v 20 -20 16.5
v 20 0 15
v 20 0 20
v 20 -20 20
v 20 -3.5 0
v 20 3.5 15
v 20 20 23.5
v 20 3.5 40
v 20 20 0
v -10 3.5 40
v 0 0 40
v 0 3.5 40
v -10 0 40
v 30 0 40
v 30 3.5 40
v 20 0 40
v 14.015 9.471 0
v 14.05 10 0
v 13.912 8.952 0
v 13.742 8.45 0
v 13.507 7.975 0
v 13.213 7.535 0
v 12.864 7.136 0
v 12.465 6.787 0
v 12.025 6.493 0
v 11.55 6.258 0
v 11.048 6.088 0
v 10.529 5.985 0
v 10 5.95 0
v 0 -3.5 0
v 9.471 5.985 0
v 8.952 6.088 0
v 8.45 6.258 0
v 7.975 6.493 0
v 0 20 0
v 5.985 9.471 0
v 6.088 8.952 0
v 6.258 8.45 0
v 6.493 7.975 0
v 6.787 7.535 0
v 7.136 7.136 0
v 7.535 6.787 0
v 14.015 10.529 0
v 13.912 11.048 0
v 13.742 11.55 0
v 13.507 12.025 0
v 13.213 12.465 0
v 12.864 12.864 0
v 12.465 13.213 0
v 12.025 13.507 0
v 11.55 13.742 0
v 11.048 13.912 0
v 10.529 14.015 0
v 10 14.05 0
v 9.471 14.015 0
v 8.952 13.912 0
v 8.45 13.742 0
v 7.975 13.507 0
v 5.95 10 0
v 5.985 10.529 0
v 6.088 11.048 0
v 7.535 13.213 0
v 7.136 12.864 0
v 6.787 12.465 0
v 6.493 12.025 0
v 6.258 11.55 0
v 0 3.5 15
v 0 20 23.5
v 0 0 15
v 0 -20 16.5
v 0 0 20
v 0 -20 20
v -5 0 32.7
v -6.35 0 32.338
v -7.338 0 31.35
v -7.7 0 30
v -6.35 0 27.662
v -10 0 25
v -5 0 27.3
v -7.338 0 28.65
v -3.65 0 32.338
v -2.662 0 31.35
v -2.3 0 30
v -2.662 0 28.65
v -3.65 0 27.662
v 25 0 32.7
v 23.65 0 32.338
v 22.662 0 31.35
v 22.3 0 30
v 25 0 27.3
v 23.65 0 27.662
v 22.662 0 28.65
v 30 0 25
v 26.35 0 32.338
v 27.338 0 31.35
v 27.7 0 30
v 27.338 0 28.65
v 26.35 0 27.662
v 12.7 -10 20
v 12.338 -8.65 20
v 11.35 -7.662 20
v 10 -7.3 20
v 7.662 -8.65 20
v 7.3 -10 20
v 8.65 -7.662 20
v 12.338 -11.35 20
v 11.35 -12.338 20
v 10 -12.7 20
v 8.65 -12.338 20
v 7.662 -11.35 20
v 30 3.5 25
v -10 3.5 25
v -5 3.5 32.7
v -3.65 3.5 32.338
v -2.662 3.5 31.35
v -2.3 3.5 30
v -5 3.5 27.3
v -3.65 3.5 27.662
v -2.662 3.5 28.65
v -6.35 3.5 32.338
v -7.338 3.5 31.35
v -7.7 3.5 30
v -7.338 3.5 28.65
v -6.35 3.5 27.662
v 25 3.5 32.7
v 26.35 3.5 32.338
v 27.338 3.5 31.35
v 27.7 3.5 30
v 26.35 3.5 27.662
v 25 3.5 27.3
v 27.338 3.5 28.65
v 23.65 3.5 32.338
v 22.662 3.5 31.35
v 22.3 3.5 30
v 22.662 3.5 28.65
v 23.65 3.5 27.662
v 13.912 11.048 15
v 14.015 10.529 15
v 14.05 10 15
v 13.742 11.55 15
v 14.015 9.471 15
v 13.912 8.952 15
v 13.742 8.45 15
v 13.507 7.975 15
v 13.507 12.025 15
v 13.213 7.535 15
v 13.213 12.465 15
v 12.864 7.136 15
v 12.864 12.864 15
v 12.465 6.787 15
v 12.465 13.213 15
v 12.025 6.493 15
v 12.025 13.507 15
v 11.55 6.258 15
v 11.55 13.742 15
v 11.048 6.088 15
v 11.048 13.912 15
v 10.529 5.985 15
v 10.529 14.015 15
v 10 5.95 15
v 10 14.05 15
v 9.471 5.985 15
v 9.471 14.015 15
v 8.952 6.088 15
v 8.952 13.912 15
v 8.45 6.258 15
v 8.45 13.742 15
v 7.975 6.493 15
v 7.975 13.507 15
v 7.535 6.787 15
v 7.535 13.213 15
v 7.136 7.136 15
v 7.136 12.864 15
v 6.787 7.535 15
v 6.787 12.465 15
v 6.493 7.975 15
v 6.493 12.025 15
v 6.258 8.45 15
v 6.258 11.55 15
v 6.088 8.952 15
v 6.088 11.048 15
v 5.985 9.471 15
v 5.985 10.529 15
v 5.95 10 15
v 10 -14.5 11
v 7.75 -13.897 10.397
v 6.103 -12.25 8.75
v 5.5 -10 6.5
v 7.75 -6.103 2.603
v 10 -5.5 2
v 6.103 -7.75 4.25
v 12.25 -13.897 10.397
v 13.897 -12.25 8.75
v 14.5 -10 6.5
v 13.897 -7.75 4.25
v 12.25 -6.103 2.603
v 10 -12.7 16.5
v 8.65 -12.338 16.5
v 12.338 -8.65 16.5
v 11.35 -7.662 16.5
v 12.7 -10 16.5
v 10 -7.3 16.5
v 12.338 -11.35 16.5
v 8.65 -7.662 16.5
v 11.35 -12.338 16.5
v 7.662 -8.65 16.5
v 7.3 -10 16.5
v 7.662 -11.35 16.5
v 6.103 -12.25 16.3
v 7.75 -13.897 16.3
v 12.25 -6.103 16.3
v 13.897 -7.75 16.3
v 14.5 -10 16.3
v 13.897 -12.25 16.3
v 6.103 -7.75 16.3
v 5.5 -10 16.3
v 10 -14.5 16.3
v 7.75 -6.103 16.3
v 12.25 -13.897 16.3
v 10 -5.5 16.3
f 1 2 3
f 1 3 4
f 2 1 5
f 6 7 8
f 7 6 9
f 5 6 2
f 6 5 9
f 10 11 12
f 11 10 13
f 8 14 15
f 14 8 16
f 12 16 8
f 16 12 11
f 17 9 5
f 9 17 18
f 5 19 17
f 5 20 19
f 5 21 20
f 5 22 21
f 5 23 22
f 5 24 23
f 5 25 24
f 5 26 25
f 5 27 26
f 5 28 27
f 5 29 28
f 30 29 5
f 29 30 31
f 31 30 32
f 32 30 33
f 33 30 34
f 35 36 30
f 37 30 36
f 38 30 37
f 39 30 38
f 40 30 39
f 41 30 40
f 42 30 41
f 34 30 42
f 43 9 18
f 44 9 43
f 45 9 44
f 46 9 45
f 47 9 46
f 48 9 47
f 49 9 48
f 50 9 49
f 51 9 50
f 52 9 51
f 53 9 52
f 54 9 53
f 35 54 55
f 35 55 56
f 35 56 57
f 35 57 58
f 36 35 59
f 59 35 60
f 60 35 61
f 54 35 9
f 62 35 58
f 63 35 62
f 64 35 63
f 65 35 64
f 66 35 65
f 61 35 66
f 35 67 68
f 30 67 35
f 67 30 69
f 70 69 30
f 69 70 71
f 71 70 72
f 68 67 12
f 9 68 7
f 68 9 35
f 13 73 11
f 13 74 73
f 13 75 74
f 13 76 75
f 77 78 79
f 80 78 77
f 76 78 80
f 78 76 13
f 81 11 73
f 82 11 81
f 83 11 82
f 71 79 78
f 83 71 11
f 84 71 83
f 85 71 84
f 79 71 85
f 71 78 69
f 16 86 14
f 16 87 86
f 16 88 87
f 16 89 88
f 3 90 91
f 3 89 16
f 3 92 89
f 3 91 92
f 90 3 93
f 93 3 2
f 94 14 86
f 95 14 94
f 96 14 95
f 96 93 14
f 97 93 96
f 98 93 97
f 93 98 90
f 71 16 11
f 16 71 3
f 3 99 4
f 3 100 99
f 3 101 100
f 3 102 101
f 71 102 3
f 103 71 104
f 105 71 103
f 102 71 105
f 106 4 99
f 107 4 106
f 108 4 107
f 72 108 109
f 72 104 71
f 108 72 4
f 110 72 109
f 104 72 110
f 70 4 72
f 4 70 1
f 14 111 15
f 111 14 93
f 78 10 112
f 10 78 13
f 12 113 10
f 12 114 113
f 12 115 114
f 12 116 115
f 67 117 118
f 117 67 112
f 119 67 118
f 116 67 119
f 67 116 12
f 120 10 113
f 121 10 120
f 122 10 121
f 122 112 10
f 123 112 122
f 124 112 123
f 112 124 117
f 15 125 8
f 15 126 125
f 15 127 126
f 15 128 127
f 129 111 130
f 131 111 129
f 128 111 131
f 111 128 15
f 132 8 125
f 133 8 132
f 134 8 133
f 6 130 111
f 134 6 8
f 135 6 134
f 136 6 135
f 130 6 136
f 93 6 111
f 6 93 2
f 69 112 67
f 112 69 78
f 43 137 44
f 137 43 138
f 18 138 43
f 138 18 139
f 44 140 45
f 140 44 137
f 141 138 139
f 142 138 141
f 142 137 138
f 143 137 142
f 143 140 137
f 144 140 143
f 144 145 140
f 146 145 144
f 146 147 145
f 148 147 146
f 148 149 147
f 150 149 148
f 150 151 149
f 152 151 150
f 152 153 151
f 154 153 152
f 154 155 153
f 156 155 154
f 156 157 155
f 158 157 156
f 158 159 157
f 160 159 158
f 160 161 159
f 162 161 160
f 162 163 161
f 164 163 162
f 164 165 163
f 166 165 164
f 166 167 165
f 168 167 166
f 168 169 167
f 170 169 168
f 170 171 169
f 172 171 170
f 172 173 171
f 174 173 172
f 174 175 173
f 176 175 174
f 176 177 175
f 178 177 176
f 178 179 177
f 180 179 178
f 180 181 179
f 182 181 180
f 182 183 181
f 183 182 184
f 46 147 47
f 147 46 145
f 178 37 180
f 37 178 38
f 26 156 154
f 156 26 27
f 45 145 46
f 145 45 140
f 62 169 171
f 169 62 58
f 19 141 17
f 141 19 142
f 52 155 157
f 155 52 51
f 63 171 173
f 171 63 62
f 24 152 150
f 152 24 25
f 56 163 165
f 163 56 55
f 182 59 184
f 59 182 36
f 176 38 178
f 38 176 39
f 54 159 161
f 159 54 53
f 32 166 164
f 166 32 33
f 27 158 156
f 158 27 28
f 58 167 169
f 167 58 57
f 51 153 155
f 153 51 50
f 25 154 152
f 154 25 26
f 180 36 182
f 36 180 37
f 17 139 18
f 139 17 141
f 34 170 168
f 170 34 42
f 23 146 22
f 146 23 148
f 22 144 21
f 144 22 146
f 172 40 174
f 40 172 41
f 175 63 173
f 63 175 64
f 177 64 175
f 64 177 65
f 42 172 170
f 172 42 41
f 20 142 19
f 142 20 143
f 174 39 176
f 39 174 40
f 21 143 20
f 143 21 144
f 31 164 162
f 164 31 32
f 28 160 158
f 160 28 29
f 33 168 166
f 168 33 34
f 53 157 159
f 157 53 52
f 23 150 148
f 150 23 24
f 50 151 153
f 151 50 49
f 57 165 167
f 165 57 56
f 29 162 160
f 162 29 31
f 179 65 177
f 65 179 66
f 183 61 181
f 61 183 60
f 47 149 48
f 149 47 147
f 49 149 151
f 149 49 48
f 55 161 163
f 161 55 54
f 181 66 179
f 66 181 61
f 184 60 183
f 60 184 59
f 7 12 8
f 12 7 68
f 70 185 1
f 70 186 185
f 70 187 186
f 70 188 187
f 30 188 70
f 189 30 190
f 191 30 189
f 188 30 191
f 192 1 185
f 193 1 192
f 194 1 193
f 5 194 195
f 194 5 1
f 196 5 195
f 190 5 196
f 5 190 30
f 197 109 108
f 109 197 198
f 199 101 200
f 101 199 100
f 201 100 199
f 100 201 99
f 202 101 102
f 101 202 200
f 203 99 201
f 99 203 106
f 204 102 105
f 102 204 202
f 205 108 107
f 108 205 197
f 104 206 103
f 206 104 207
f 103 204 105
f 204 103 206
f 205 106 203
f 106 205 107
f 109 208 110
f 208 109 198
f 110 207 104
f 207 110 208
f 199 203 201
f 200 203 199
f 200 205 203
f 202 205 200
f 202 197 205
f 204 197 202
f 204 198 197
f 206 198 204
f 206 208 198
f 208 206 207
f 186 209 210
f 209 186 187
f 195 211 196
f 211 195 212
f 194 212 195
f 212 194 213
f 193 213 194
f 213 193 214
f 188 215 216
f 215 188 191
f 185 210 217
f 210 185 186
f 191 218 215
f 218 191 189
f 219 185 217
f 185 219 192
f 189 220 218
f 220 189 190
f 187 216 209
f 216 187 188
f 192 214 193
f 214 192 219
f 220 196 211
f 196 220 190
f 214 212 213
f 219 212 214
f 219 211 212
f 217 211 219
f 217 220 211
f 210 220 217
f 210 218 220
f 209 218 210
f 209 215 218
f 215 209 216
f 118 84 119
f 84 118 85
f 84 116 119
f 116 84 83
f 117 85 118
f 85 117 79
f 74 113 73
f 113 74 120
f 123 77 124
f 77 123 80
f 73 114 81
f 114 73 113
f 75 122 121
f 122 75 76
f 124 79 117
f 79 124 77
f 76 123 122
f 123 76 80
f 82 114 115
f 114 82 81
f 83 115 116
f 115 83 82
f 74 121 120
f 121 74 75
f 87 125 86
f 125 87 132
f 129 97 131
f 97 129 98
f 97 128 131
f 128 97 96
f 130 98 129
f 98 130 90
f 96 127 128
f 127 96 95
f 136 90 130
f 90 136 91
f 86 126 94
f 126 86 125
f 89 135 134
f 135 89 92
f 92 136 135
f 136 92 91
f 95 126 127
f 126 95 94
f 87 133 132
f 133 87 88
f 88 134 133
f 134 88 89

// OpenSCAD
t=3.5;

difference()
{
    union()
    {
        cube([20,20,40]);
        
        translate([0,-20,0])
            cube([20,20,20]);
        
        translate([-10,0,25])
            cube([40,t,15]);
        
        translate([-10,0,25])
            rotate([0,45,0])
                cube([40/sqrt(2),t,40/sqrt(2)]);
        
        //rotate([45,0,0])
           // cube([20,20*sqrt(2),20*sqrt(2)]);
    }
    union()
    {
        translate([0,-20,20])
            cube([20,20,20]);
        
        translate([0,0,40])
            cube([20,20,20]);
        
        translate([10,10,0])
            cylinder(d=8.1,h=15,$fn=48);
        
        translate([0,20,20+t])
            rotate([45,0,0])
                cube([20,20*sqrt(2),20*sqrt(2)]);
        
        translate([0,-20,-20-t])
            rotate([45,0,0])
                cube([20,20*sqrt(2),20*sqrt(2)]);
        
        translate([10,-10,20-t])
            cylinder(d=5.4,h=t,$fn=12);
        translate([10,-10,0])
            cylinder(d=9,h=20-t-0.2,$fn=12);
        
        translate([-5,0,30])
            rotate([270,0,0])
                cylinder(d=5.4,h=t+1,$fn=12);
        translate([20+5,0,30])
            rotate([270,0,0])
                cylinder(d=5.4,h=t+1,$fn=12);
    }
}
